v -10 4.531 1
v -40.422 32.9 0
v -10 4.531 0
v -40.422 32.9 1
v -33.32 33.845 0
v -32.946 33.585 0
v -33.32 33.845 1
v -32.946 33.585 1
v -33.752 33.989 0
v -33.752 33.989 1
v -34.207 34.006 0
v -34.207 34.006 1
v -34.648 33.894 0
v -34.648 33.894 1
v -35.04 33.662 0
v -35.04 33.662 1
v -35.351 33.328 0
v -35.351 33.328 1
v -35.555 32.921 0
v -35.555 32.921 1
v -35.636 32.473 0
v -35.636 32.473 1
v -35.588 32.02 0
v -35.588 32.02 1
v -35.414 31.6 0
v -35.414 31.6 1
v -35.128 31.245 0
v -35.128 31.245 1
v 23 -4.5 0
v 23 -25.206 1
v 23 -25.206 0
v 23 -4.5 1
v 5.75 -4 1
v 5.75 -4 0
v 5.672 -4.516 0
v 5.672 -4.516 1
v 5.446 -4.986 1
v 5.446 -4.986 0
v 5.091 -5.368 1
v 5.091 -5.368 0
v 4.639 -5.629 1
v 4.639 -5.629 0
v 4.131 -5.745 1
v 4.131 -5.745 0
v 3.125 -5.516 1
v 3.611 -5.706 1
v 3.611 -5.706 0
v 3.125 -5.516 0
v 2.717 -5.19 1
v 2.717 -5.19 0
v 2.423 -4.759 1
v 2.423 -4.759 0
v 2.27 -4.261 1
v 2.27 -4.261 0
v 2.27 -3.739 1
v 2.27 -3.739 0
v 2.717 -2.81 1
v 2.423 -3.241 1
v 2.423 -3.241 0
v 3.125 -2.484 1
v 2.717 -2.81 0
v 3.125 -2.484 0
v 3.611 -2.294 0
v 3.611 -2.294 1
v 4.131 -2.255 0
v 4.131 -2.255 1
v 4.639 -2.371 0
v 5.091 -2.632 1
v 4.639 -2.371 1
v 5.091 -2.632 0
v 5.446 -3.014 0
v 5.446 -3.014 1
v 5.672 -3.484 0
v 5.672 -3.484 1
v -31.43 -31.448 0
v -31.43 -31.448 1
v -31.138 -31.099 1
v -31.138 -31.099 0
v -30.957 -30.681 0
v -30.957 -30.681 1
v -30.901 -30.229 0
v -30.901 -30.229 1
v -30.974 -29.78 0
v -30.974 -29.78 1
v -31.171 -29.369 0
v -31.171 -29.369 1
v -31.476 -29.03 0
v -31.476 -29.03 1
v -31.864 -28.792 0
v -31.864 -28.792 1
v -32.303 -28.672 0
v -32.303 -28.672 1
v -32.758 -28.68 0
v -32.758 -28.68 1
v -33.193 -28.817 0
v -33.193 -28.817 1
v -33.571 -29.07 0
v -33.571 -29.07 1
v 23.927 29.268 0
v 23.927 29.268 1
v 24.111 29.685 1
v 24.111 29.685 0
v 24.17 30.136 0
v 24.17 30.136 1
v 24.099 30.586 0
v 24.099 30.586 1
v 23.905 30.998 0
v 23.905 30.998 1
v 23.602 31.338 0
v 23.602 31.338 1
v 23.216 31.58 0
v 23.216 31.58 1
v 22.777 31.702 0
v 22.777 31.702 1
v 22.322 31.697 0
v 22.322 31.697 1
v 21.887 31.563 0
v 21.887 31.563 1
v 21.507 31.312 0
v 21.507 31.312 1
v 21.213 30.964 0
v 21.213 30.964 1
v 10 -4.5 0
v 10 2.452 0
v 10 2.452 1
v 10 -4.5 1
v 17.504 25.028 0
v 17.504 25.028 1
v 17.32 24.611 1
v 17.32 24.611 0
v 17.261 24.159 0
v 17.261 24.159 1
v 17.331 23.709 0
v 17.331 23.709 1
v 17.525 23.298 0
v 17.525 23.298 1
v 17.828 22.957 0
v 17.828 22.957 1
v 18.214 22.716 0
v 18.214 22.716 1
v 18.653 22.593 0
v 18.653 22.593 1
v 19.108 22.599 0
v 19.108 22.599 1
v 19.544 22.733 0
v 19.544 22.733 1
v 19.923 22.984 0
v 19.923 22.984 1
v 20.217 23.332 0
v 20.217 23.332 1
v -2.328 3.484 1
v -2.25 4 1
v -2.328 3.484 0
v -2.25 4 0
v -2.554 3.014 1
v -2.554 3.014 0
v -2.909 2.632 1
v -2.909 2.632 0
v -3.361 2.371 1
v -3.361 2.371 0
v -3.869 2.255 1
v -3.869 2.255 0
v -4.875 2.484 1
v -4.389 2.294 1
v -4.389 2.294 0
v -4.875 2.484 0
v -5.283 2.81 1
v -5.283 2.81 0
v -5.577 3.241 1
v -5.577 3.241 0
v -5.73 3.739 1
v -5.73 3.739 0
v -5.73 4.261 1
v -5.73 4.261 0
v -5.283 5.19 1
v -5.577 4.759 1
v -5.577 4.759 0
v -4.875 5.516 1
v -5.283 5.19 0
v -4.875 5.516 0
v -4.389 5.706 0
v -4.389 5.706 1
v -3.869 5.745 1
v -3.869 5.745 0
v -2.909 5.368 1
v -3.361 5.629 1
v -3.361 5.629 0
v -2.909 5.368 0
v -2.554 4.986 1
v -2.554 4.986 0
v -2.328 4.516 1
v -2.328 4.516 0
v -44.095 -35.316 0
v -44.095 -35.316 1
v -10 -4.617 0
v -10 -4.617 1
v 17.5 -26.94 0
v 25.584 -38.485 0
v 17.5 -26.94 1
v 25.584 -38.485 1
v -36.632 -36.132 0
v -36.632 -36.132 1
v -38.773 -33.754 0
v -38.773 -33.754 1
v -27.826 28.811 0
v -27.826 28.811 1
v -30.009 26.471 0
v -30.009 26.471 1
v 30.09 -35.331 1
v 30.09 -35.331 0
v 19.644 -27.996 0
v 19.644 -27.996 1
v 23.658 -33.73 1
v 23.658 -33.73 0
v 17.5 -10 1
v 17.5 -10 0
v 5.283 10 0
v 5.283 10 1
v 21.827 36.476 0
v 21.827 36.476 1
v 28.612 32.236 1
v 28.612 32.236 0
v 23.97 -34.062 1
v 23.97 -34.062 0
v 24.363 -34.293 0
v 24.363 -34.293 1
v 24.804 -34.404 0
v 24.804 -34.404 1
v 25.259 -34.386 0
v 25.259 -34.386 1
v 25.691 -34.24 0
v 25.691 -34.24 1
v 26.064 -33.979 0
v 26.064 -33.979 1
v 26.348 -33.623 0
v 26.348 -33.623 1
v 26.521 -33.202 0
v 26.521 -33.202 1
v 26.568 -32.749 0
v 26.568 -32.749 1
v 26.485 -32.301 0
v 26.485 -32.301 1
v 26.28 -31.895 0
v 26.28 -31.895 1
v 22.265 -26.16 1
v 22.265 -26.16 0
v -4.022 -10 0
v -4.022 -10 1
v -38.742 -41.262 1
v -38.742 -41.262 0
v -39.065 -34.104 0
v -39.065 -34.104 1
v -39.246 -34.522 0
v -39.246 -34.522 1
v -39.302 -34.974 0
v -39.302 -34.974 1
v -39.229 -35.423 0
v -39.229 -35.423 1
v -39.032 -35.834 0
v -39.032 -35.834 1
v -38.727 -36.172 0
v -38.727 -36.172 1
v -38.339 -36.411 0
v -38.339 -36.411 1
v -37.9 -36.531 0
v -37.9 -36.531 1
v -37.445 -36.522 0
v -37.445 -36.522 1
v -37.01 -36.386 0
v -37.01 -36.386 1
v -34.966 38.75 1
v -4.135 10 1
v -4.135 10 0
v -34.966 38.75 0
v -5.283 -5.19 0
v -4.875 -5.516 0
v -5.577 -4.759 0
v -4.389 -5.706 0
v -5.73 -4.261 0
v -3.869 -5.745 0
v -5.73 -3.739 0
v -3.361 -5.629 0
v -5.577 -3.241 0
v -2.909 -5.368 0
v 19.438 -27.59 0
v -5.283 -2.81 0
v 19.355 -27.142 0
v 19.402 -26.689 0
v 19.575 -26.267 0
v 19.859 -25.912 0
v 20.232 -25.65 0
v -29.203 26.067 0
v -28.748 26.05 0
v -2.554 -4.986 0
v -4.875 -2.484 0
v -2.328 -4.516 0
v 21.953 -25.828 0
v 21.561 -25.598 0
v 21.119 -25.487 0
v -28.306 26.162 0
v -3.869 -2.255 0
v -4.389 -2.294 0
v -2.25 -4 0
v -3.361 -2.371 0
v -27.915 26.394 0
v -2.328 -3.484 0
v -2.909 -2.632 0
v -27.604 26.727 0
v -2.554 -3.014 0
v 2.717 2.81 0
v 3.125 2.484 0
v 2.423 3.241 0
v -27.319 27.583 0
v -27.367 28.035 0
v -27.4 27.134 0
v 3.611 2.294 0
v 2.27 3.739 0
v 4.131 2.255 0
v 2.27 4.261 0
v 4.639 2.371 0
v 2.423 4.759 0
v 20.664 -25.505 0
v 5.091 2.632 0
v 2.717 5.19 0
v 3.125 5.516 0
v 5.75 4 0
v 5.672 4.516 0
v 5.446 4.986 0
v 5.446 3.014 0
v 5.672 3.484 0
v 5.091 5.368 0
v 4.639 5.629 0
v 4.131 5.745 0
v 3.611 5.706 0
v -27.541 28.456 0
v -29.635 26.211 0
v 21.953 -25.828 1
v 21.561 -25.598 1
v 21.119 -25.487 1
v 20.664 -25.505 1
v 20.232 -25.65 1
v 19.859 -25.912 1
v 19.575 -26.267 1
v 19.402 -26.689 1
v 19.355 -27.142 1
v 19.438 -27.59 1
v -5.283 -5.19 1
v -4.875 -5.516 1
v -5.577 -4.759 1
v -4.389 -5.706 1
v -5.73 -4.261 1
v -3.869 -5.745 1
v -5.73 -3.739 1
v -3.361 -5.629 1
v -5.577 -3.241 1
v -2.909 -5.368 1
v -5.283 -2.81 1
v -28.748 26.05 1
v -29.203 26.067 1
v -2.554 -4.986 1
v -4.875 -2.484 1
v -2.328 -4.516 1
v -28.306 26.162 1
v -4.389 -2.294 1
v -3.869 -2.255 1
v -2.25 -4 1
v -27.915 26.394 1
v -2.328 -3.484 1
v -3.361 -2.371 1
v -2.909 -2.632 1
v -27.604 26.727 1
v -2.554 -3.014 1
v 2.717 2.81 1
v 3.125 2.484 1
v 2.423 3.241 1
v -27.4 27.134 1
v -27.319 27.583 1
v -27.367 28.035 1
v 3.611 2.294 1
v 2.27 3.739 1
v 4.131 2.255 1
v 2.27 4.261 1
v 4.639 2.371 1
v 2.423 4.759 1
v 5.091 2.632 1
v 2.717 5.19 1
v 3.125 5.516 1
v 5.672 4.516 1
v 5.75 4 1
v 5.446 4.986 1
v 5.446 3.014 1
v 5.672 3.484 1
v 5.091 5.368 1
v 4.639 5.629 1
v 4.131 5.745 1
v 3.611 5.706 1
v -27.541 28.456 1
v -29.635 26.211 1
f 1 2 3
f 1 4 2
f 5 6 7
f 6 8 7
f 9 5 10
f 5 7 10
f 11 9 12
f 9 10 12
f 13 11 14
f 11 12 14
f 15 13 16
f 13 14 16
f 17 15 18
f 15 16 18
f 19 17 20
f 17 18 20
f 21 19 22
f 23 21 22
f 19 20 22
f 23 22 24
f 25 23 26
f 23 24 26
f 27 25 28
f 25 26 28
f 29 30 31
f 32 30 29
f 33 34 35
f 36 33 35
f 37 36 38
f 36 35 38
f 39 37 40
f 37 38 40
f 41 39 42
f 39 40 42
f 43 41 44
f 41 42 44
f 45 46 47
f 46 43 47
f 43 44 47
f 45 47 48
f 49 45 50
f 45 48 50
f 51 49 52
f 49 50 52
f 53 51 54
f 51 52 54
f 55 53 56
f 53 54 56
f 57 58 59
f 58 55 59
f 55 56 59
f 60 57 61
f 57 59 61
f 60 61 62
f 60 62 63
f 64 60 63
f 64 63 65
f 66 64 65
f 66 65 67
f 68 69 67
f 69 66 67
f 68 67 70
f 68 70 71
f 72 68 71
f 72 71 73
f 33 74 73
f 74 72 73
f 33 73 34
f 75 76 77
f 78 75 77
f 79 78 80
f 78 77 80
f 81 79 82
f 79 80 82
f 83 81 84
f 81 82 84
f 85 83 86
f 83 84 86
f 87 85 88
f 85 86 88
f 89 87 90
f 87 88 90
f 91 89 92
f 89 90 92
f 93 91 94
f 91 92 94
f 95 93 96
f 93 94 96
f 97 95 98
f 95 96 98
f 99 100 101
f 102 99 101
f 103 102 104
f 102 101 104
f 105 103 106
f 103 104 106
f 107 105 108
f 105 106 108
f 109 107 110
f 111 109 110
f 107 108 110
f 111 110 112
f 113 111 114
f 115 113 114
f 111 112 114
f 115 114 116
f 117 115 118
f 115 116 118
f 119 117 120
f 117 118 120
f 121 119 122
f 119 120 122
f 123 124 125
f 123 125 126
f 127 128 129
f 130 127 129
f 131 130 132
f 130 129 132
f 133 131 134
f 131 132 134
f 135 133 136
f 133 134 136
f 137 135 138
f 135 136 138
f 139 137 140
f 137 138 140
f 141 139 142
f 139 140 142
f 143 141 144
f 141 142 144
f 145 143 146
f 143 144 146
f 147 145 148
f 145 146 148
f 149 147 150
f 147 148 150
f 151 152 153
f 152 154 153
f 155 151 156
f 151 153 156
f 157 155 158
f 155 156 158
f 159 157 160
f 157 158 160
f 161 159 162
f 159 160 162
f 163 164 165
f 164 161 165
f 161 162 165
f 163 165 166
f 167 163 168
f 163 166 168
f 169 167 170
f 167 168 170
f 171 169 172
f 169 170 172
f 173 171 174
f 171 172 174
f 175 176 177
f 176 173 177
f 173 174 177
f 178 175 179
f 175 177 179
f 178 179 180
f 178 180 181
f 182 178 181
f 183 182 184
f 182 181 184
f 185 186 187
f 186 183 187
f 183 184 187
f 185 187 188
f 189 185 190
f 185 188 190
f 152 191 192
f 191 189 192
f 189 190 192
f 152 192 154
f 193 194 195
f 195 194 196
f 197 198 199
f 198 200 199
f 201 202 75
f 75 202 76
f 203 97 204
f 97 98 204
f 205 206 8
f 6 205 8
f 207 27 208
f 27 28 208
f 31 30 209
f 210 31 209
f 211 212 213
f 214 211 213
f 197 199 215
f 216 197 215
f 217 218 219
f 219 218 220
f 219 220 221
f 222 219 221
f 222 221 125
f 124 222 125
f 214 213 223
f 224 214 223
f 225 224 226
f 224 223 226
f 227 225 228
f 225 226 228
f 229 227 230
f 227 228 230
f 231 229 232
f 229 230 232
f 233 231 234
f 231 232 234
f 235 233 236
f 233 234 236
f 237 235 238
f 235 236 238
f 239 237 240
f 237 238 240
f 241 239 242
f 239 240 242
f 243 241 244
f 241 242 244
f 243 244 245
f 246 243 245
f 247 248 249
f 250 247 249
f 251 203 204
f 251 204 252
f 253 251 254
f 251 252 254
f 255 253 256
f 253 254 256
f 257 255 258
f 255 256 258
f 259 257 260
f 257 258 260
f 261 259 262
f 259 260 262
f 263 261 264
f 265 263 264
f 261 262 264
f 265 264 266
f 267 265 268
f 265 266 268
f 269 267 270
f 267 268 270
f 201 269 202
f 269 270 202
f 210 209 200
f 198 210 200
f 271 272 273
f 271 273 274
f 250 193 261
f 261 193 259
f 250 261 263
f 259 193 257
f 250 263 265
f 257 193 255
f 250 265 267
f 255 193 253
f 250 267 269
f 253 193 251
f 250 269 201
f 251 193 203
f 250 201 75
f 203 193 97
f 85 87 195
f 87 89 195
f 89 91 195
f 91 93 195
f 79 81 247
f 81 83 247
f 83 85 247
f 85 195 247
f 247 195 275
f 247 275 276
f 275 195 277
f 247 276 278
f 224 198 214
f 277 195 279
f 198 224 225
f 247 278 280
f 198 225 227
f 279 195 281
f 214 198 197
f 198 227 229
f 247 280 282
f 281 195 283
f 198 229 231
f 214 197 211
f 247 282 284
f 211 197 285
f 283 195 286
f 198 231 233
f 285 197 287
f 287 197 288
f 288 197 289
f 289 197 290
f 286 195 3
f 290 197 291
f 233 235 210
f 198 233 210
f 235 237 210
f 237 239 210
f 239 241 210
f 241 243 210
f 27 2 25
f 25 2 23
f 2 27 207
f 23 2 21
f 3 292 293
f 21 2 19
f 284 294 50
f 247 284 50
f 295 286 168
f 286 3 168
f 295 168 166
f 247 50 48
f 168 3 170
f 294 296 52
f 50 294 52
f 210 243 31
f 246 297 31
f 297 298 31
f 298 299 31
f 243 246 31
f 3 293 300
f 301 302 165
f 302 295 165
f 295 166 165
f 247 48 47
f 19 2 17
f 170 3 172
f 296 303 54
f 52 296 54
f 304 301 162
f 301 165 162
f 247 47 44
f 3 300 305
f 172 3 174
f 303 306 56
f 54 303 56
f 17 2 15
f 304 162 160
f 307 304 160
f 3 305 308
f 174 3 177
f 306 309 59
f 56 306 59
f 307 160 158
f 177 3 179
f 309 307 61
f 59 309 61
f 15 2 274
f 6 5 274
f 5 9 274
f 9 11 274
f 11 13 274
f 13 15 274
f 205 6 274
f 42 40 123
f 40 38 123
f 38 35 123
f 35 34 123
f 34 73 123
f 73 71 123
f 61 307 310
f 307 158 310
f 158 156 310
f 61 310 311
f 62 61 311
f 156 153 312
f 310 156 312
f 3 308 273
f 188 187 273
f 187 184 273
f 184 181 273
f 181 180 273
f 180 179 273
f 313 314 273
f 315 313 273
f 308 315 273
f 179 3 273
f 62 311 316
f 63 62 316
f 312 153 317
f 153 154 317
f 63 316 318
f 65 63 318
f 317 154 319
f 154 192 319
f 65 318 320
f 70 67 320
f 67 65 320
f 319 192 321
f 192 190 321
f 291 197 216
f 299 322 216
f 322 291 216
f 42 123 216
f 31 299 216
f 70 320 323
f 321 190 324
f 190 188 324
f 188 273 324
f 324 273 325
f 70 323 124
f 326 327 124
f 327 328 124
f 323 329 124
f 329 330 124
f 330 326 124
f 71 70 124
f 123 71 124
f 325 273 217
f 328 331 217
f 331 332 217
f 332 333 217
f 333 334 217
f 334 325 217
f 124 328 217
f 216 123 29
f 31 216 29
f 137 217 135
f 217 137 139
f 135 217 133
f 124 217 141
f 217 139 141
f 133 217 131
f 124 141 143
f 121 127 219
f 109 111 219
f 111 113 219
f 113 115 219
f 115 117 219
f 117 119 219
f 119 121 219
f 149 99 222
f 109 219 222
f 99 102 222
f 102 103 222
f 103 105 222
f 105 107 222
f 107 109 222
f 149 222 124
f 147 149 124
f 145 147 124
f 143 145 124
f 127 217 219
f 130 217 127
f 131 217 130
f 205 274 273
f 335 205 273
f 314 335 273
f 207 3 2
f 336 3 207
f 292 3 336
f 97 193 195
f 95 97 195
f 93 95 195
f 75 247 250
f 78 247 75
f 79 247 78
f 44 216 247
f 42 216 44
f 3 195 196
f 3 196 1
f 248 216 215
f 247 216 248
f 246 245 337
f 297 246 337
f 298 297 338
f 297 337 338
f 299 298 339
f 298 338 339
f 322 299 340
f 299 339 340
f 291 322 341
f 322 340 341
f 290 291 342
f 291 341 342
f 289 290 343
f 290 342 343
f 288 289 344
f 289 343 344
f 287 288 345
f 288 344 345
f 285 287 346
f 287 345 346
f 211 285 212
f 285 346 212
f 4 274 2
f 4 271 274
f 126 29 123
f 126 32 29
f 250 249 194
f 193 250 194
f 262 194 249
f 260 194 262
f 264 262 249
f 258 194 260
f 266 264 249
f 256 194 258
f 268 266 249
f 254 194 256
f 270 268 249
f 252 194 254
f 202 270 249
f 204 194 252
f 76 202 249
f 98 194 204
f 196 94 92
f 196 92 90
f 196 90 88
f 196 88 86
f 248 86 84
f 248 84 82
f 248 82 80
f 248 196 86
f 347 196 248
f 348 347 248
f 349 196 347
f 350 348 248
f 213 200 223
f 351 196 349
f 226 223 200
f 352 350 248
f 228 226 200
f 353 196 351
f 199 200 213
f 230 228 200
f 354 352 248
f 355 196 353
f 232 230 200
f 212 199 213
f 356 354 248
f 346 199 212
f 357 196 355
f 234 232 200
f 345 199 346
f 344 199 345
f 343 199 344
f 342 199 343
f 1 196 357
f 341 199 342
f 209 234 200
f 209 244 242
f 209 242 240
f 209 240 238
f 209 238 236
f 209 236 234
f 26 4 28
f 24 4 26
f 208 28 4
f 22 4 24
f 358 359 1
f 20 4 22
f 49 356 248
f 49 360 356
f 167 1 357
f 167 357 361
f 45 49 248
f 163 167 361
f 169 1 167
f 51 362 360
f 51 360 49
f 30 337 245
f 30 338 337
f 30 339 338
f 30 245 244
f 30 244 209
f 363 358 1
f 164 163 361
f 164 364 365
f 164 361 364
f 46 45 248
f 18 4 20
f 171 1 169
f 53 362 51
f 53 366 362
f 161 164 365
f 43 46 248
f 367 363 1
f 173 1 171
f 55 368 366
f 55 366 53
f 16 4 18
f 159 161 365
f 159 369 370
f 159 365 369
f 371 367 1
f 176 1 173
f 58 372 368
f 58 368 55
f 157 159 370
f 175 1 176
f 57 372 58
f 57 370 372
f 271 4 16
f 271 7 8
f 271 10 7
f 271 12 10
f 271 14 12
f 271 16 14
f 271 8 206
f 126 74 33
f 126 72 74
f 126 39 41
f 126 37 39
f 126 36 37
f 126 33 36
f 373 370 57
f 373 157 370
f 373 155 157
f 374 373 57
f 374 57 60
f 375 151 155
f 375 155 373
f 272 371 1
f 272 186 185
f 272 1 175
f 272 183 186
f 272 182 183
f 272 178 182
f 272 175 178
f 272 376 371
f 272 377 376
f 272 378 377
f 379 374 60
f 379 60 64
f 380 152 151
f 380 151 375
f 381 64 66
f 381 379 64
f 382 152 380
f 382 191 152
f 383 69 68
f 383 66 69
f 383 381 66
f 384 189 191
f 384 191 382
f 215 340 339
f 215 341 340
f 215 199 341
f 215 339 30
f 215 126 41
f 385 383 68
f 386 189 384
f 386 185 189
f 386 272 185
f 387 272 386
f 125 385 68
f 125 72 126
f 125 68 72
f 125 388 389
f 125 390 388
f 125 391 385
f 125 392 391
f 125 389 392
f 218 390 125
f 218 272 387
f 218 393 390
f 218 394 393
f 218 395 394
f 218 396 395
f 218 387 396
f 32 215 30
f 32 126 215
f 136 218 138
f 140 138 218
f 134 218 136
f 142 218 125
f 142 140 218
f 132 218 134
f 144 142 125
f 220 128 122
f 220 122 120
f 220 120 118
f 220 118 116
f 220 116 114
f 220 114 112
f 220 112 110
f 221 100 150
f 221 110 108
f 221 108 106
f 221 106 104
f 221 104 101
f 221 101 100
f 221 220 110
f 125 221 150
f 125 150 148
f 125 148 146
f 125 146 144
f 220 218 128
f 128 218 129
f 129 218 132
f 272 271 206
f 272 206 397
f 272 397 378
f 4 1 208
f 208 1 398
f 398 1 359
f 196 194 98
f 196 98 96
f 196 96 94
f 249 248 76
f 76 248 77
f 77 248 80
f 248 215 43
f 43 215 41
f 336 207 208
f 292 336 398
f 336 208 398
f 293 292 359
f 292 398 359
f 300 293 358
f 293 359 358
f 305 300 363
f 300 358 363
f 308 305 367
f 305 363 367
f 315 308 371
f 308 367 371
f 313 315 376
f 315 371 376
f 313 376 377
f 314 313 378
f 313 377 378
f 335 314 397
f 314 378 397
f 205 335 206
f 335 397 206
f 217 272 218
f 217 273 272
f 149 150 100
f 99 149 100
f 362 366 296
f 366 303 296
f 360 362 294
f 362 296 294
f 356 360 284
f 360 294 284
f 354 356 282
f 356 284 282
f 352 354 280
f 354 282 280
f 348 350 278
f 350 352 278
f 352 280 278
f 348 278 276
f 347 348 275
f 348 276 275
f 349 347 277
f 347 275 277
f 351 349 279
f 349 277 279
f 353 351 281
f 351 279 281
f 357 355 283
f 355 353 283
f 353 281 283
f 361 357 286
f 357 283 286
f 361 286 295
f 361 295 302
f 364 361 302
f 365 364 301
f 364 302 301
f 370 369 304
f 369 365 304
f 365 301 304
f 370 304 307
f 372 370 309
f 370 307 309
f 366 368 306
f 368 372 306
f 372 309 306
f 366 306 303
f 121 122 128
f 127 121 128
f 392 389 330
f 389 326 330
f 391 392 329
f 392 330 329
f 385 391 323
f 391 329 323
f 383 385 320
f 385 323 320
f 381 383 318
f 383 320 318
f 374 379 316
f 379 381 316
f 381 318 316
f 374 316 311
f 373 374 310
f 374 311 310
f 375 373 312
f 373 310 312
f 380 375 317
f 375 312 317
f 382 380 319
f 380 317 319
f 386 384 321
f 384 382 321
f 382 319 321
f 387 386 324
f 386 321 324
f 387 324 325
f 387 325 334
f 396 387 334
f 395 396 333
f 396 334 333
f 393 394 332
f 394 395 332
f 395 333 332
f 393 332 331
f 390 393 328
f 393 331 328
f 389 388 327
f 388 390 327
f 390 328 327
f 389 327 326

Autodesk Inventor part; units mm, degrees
ref_plane "YZ Plane" through (0, 0, 0) normal (1, 0, 0) x (0, 1, 0)
ref_plane "XZ Plane" through (0, 0, 0) normal (0, 1, 0) x (-1, 0, 0)
ref_plane "XY Plane" through (0, 0, 0) normal (0, 0, 1) x (1, 0, 0)
sketch "Sketch1" plane through (0, 0, 0) normal (0, 0, 1) x (1, 0, 0)
  line L0 (-10, 10) -> (10, 10)
  line L1 (10, 10) -> (10, -10)
  line L2 (10, -10) -> (-10, -10)
  line L3 (-10, -10) -> (-10, 10)
  line L4 (-10, 10) -> (10, -10) construction
  line L5 (10, 10) -> (-10, -10) construction
  circle A0 centre (-4, 4) radius 1.75
  line L6 (-4, 4) -> (0.2191, 4)
  line L7 (0.2191, 4) -> (0.2191, 2.6146)
  circle A1 centre (4, 4) radius 1.75
  circle A2 centre (-4, -4) radius 1.75
  circle A3 centre (4, -4) radius 1.75
  point P0 (0, 0)
  dimension "d0" = 20
  dimension "d1" = 20
  dimension "d2" = 3.5
  dimension "d5" = 8
  dimension "d8" = 8
  dimension "d11" = 4
  dimension "d12" = 4
extrude "Plate1" add sketch "Sketch1" along normal blind 1
sketch "Sketch2" plane through (0, 0, 1) normal (0, 0, 1) x (1, 0, 0)
  line L0 (-10, -10) -> (-10, 10)
  line L1 (-10, 10) -> (-33.9394, 32.3238)
  line L2 (-10, -10) -> (-37.6112, -34.8612)
  line L3 (-10, 10) -> (10, 10)
  line L4 (10, 10) -> (17.9255, 22.6834)
  line L5 (10, -10) -> (-10, -10)
  line L6 (-40.4218, 32.8995) -> (-8.9736, 3.5735)
  line L7 (-8.9736, 3.5735) -> (-3.5176, 9.4244)
  line L8 (-3.5176, 9.4244) -> (-34.9658, 38.7503)
  line L9 (-34.9658, 38.7503) -> (-40.4218, 32.8995)
  line L10 (-40.4218, 32.8995) -> (-3.5176, 9.4244) construction
  line L11 (-8.9736, 3.5735) -> (-34.9658, 38.7503) construction
  line L12 (10, 10) -> (10, -10)
  line L13 (-44.0946, -35.3164) -> (-8.8696, -3.5996)
  line L14 (-8.8696, -3.5996) -> (-3.5165, -9.5448)
  line L15 (-3.5165, -9.5448) -> (-38.7416, -41.2616)
  line L16 (-38.7416, -41.2616) -> (-44.0946, -35.3164)
  line L17 (-44.0946, -35.3164) -> (-3.5165, -9.5448) construction
  line L18 (-8.8696, -3.5996) -> (-38.7416, -41.2616) construction
  line L19 (28.6116, 32.2365) -> (9.9585, 2.3852)
  line L20 (9.9585, 2.3852) -> (3.1741, 6.6246)
  line L21 (3.1741, 6.6246) -> (21.8273, 36.4759)
  line L22 (21.8273, 36.4759) -> (28.6116, 32.2365)
  line L23 (28.6116, 32.2365) -> (3.1741, 6.6246) construction
  line L24 (9.9585, 2.3852) -> (21.8273, 36.4759) construction
  line L25 (23, -4.5) -> (10, -4.5)
  line L26 (10, -4.5) -> (10, -10)
  line L27 (10, -10) -> (23, -10)
  line L28 (23, -10) -> (23, -4.5)
  line L29 (23, -4.5) -> (10, -10) construction
  line L30 (10, -4.5) -> (23, -10) construction
  line L31 (17.5, -26.9397) -> (17.5, -10)
  line L32 (17.5, -10) -> (23, -10)
  line L33 (23, -10) -> (23, -30)
  line L34 (23, -30) -> (19.6429, -30)
  line L35 (16.1337, -34.9685) -> (23, -10) construction
  line L36 (17.5, -10) -> (23, -30) construction
  line L37 (25.5844, -38.4854) -> (17.5, -26.9397)
  line L38 (17.5, -26.9397) -> (22.0053, -23.785)
  line L39 (22.0053, -23.785) -> (30.0897, -35.3307)
  line L40 (30.0897, -35.3307) -> (25.5844, -38.4854)
  line L41 (25.5844, -38.4854) -> (22.0053, -23.785) construction
  line L42 (17.5, -26.9397) -> (30.0897, -35.3307) construction
  line L43 (23, -30) -> (23.7949, -31.1352)
  point P0 (0, 0)
  point P1 (-21.9697, 21.1619)
  point P2 (-23.8056, -22.4306)
  point P3 (15.8929, 19.4306)
  point P4 (16.5, -7.25)
  point P5 (20.25, -20)
  dimension "d14" = 137
  dimension "d15" = 138
  dimension "d17" = 148
  dimension "d18" = 8
  dimension "d19" = 8
  dimension "d21" = 8
  dimension "d22" = 42.5
  dimension "d23" = 7.3
  dimension "d24" = 9
  dimension "d25" = 9
  dimension "d28" = 56.4
  dimension "d29" = 52
  dimension "d35" = 5.5
  dimension "d36" = 5.5
  dimension "d38" = 13
  dimension "d39" = 20
  dimension "d41" = 5.5
  dimension "d42" = 145
  dimension "d43" = 46.2
sheet face with bend "Face2" sketch "Sketch2" thickness 1 toward (0, 0, -1) bend radius 1 contours L5 L15 L16 L13 L0 | L0 L13 L14 L15 L5 | L6 L9 L8 L3 L0 | L0 L3 L8 L7 L6 | L12 L25 L28 L27 | L27 L33 L39 L38 L31 | L19 L20 L21 L3 L12 | L12 L3 L21 L22 L19 | L38 L39 L33 L34 L37 | L39 L40 L37 L34 L33
bend "Bend1"
sketch "Sketch4" plane through (0, 0, 1) normal (0, 0, 1) x (1, 0, 0)
  circle A0 centre (-32.5004, -30.2594) radius 1.6
  circle A1 centre (-37.7024, -34.9433) radius 1.6
  circle A2 centre (-34.037, 32.4149) radius 1.6
  circle A3 centre (-28.9175, 27.6409) radius 1.6
  circle A4 centre (22.5699, 30.116) radius 1.6
  circle A5 centre (18.8604, 24.1796) radius 1.6
  line L0 (-34.037, 32.4149) -> (-28.9175, 27.6409)
  line L1 (22.5699, 30.116) -> (18.8604, 24.1796)
  line L2 (-37.7024, -34.9433) -> (-32.5004, -30.2594)
  line L3 (20.9542, -27.0782) -> (24.9692, -32.8123)
  line L4 (30.0897, -35.3307) -> (23, -25.2055) projected
  circle A6 centre (20.9542, -27.0782) radius 1.6
  circle A7 centre (24.9692, -32.8123) radius 1.6
  line L5 (25.5844, -38.4854) -> (30.0897, -35.3307) projected
  line L6 (28.6116, 32.2365) -> (10, 2.4517) projected
  line L7 (-4.1349, 10) -> (-34.9658, 38.7503) projected
  line L8 (-44.0946, -35.3164) -> (-10, -4.6175) projected
  line L9 (-38.7416, -41.2616) -> (-44.0946, -35.3164) projected
  line L10 (21.8273, 36.4759) -> (28.6116, 32.2365) projected
  line L11 (-34.9658, 38.7503) -> (-40.4218, 32.8995) projected
  line L12 (-37.7024, -34.9433) -> (-32.5004, -30.2594) construction
  line L13 (-36.6318, -36.1324) -> (-31.4298, -31.4485)
  line L14 (-33.571, -29.0704) -> (-38.773, -33.7543)
  arc A8 (-38.773, -33.7543) -> (-36.6318, -36.1324) centre (-37.7024, -34.9433) ccw
  arc A9 (-31.4298, -31.4485) -> (-33.571, -29.0704) centre (-32.5004, -30.2594) ccw
  line L15 (20.9542, -27.0782) -> (24.9692, -32.8123) construction
  line L16 (19.6435, -27.996) -> (23.6585, -33.73)
  line L17 (26.2798, -31.8946) -> (22.2648, -26.1605)
  arc A10 (22.2648, -26.1605) -> (19.6435, -27.996) centre (20.9542, -27.0782) ccw
  arc A11 (23.6585, -33.73) -> (26.2798, -31.8946) centre (24.9692, -32.8123) ccw
  line L18 (18.8604, 24.1796) -> (22.5699, 30.116) construction
  line L19 (20.2173, 23.3318) -> (23.9267, 29.2681)
  line L20 (21.213, 30.9638) -> (17.5035, 25.0275)
  arc A12 (17.5035, 25.0275) -> (20.2173, 23.3318) centre (18.8604, 24.1796) ccw
  arc A13 (23.9267, 29.2681) -> (21.213, 30.9638) centre (22.5699, 30.116) ccw
  line L21 (-28.9175, 27.6409) -> (-34.037, 32.4149) construction
  line L22 (-27.8263, 28.8111) -> (-32.9458, 33.5851)
  line L23 (-35.1282, 31.2447) -> (-30.0087, 26.4707)
  arc A14 (-30.0087, 26.4707) -> (-27.8263, 28.8111) centre (-28.9175, 27.6409) ccw
  arc A15 (-32.9458, 33.5851) -> (-35.1282, 31.2447) centre (-34.037, 32.4149) ccw
  point P0 (0, 0)
  point P1 (-35.1014, -32.6014)
  point P2 (22.9617, -29.9453)
  point P3 (20.7151, 27.1478)
  point P4 (-31.4773, 30.0279)
  dimension "d54" = 2.75
  dimension "d55" = 3.2
  dimension "d56" = 3.2
  dimension "d58" = 5
  dimension "d59" = 7
  dimension "d60" = 3.2
  dimension "d61" = 3.2
  dimension "d62" = 3.2
  dimension "d63" = 3.2
  dimension "d64" = 3.2
  dimension "d65" = 3.2
  dimension "d66" = 8
  dimension "d67" = 8
  dimension "d68" = 8
  dimension "d69" = 5
  dimension "d70" = 7
  dimension "d71" = 5
  dimension "d72" = 7
  dimension "d73" = 5
  dimension "d74" = 7
extrude "Cut1" cut sketch "Sketch4" against normal blind 1
sketch "Sketch3" plane through (-41.7142, -43.9381, 0) normal (-0.7431448, -0.6691306, 0) x (0.6691306, -0.7431448, 0)
  line L0 (-8, 0) -> (0, 0)
  line L1 (0, 0) -> (0, 25)
  line L2 (0, 25) -> (-8, 25)
  line L3 (-8, 25) -> (-8, 0)
equation "\"d75\" = 厚度"
equation "\"d13\" = 厚度"
equation "\"d30\" = 折彎半徑"
equation "\"d31\" = 折彎離隙寬度"
equation "\"d33\" = 最小剩餘"
equation "\"d32\" = 折彎離隙深度"
equation "\"d34\" = 轉移半徑"
equation "\"折彎半徑\" = 厚度"
equation "\"折彎離隙寬度\" = 厚度"
equation "\"折彎離隙深度\" = 0.5 * 厚度"
equation "\"轉角離隙大小\" = 4 * 厚度"
equation "\"最小剩餘\" = 2 * 厚度"
equation "\"轉移半徑\" = 折彎半徑"
equation "\"Jacobi半徑大小\" = 折彎半徑"
equation "\"間隙大小\" = 厚度"
equation "\"厚度\" = 1"
properties part number "watercooler_fixed2"
